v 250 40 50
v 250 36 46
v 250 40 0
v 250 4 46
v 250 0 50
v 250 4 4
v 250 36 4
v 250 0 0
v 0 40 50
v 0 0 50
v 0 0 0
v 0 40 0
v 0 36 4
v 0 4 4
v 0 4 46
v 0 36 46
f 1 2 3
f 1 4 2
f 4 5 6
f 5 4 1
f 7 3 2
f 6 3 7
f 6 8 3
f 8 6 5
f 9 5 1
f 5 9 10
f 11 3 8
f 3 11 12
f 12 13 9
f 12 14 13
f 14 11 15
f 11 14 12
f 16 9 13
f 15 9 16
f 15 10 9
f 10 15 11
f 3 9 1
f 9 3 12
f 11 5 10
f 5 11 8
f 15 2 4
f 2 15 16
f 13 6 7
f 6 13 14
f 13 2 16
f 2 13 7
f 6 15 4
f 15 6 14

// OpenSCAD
$fn = 32;

// ----------------------------------------------------------------------
// Box beam: 200-250 mm hollow beam
// ----------------------------------------------------------------------

// --- parameters (mm) ---
beam_l = 250;             // beam length, X
beam_w = 40;              // beam width, Y
beam_h = 50;              // beam height, Z
wall = 4;                 // wall thickness

difference() {
  cube([beam_l, beam_w, beam_h]);
  translate([-1, wall, wall])
    cube([beam_l + 2, beam_w - 2 * wall, beam_h - 2 * wall]);
}
